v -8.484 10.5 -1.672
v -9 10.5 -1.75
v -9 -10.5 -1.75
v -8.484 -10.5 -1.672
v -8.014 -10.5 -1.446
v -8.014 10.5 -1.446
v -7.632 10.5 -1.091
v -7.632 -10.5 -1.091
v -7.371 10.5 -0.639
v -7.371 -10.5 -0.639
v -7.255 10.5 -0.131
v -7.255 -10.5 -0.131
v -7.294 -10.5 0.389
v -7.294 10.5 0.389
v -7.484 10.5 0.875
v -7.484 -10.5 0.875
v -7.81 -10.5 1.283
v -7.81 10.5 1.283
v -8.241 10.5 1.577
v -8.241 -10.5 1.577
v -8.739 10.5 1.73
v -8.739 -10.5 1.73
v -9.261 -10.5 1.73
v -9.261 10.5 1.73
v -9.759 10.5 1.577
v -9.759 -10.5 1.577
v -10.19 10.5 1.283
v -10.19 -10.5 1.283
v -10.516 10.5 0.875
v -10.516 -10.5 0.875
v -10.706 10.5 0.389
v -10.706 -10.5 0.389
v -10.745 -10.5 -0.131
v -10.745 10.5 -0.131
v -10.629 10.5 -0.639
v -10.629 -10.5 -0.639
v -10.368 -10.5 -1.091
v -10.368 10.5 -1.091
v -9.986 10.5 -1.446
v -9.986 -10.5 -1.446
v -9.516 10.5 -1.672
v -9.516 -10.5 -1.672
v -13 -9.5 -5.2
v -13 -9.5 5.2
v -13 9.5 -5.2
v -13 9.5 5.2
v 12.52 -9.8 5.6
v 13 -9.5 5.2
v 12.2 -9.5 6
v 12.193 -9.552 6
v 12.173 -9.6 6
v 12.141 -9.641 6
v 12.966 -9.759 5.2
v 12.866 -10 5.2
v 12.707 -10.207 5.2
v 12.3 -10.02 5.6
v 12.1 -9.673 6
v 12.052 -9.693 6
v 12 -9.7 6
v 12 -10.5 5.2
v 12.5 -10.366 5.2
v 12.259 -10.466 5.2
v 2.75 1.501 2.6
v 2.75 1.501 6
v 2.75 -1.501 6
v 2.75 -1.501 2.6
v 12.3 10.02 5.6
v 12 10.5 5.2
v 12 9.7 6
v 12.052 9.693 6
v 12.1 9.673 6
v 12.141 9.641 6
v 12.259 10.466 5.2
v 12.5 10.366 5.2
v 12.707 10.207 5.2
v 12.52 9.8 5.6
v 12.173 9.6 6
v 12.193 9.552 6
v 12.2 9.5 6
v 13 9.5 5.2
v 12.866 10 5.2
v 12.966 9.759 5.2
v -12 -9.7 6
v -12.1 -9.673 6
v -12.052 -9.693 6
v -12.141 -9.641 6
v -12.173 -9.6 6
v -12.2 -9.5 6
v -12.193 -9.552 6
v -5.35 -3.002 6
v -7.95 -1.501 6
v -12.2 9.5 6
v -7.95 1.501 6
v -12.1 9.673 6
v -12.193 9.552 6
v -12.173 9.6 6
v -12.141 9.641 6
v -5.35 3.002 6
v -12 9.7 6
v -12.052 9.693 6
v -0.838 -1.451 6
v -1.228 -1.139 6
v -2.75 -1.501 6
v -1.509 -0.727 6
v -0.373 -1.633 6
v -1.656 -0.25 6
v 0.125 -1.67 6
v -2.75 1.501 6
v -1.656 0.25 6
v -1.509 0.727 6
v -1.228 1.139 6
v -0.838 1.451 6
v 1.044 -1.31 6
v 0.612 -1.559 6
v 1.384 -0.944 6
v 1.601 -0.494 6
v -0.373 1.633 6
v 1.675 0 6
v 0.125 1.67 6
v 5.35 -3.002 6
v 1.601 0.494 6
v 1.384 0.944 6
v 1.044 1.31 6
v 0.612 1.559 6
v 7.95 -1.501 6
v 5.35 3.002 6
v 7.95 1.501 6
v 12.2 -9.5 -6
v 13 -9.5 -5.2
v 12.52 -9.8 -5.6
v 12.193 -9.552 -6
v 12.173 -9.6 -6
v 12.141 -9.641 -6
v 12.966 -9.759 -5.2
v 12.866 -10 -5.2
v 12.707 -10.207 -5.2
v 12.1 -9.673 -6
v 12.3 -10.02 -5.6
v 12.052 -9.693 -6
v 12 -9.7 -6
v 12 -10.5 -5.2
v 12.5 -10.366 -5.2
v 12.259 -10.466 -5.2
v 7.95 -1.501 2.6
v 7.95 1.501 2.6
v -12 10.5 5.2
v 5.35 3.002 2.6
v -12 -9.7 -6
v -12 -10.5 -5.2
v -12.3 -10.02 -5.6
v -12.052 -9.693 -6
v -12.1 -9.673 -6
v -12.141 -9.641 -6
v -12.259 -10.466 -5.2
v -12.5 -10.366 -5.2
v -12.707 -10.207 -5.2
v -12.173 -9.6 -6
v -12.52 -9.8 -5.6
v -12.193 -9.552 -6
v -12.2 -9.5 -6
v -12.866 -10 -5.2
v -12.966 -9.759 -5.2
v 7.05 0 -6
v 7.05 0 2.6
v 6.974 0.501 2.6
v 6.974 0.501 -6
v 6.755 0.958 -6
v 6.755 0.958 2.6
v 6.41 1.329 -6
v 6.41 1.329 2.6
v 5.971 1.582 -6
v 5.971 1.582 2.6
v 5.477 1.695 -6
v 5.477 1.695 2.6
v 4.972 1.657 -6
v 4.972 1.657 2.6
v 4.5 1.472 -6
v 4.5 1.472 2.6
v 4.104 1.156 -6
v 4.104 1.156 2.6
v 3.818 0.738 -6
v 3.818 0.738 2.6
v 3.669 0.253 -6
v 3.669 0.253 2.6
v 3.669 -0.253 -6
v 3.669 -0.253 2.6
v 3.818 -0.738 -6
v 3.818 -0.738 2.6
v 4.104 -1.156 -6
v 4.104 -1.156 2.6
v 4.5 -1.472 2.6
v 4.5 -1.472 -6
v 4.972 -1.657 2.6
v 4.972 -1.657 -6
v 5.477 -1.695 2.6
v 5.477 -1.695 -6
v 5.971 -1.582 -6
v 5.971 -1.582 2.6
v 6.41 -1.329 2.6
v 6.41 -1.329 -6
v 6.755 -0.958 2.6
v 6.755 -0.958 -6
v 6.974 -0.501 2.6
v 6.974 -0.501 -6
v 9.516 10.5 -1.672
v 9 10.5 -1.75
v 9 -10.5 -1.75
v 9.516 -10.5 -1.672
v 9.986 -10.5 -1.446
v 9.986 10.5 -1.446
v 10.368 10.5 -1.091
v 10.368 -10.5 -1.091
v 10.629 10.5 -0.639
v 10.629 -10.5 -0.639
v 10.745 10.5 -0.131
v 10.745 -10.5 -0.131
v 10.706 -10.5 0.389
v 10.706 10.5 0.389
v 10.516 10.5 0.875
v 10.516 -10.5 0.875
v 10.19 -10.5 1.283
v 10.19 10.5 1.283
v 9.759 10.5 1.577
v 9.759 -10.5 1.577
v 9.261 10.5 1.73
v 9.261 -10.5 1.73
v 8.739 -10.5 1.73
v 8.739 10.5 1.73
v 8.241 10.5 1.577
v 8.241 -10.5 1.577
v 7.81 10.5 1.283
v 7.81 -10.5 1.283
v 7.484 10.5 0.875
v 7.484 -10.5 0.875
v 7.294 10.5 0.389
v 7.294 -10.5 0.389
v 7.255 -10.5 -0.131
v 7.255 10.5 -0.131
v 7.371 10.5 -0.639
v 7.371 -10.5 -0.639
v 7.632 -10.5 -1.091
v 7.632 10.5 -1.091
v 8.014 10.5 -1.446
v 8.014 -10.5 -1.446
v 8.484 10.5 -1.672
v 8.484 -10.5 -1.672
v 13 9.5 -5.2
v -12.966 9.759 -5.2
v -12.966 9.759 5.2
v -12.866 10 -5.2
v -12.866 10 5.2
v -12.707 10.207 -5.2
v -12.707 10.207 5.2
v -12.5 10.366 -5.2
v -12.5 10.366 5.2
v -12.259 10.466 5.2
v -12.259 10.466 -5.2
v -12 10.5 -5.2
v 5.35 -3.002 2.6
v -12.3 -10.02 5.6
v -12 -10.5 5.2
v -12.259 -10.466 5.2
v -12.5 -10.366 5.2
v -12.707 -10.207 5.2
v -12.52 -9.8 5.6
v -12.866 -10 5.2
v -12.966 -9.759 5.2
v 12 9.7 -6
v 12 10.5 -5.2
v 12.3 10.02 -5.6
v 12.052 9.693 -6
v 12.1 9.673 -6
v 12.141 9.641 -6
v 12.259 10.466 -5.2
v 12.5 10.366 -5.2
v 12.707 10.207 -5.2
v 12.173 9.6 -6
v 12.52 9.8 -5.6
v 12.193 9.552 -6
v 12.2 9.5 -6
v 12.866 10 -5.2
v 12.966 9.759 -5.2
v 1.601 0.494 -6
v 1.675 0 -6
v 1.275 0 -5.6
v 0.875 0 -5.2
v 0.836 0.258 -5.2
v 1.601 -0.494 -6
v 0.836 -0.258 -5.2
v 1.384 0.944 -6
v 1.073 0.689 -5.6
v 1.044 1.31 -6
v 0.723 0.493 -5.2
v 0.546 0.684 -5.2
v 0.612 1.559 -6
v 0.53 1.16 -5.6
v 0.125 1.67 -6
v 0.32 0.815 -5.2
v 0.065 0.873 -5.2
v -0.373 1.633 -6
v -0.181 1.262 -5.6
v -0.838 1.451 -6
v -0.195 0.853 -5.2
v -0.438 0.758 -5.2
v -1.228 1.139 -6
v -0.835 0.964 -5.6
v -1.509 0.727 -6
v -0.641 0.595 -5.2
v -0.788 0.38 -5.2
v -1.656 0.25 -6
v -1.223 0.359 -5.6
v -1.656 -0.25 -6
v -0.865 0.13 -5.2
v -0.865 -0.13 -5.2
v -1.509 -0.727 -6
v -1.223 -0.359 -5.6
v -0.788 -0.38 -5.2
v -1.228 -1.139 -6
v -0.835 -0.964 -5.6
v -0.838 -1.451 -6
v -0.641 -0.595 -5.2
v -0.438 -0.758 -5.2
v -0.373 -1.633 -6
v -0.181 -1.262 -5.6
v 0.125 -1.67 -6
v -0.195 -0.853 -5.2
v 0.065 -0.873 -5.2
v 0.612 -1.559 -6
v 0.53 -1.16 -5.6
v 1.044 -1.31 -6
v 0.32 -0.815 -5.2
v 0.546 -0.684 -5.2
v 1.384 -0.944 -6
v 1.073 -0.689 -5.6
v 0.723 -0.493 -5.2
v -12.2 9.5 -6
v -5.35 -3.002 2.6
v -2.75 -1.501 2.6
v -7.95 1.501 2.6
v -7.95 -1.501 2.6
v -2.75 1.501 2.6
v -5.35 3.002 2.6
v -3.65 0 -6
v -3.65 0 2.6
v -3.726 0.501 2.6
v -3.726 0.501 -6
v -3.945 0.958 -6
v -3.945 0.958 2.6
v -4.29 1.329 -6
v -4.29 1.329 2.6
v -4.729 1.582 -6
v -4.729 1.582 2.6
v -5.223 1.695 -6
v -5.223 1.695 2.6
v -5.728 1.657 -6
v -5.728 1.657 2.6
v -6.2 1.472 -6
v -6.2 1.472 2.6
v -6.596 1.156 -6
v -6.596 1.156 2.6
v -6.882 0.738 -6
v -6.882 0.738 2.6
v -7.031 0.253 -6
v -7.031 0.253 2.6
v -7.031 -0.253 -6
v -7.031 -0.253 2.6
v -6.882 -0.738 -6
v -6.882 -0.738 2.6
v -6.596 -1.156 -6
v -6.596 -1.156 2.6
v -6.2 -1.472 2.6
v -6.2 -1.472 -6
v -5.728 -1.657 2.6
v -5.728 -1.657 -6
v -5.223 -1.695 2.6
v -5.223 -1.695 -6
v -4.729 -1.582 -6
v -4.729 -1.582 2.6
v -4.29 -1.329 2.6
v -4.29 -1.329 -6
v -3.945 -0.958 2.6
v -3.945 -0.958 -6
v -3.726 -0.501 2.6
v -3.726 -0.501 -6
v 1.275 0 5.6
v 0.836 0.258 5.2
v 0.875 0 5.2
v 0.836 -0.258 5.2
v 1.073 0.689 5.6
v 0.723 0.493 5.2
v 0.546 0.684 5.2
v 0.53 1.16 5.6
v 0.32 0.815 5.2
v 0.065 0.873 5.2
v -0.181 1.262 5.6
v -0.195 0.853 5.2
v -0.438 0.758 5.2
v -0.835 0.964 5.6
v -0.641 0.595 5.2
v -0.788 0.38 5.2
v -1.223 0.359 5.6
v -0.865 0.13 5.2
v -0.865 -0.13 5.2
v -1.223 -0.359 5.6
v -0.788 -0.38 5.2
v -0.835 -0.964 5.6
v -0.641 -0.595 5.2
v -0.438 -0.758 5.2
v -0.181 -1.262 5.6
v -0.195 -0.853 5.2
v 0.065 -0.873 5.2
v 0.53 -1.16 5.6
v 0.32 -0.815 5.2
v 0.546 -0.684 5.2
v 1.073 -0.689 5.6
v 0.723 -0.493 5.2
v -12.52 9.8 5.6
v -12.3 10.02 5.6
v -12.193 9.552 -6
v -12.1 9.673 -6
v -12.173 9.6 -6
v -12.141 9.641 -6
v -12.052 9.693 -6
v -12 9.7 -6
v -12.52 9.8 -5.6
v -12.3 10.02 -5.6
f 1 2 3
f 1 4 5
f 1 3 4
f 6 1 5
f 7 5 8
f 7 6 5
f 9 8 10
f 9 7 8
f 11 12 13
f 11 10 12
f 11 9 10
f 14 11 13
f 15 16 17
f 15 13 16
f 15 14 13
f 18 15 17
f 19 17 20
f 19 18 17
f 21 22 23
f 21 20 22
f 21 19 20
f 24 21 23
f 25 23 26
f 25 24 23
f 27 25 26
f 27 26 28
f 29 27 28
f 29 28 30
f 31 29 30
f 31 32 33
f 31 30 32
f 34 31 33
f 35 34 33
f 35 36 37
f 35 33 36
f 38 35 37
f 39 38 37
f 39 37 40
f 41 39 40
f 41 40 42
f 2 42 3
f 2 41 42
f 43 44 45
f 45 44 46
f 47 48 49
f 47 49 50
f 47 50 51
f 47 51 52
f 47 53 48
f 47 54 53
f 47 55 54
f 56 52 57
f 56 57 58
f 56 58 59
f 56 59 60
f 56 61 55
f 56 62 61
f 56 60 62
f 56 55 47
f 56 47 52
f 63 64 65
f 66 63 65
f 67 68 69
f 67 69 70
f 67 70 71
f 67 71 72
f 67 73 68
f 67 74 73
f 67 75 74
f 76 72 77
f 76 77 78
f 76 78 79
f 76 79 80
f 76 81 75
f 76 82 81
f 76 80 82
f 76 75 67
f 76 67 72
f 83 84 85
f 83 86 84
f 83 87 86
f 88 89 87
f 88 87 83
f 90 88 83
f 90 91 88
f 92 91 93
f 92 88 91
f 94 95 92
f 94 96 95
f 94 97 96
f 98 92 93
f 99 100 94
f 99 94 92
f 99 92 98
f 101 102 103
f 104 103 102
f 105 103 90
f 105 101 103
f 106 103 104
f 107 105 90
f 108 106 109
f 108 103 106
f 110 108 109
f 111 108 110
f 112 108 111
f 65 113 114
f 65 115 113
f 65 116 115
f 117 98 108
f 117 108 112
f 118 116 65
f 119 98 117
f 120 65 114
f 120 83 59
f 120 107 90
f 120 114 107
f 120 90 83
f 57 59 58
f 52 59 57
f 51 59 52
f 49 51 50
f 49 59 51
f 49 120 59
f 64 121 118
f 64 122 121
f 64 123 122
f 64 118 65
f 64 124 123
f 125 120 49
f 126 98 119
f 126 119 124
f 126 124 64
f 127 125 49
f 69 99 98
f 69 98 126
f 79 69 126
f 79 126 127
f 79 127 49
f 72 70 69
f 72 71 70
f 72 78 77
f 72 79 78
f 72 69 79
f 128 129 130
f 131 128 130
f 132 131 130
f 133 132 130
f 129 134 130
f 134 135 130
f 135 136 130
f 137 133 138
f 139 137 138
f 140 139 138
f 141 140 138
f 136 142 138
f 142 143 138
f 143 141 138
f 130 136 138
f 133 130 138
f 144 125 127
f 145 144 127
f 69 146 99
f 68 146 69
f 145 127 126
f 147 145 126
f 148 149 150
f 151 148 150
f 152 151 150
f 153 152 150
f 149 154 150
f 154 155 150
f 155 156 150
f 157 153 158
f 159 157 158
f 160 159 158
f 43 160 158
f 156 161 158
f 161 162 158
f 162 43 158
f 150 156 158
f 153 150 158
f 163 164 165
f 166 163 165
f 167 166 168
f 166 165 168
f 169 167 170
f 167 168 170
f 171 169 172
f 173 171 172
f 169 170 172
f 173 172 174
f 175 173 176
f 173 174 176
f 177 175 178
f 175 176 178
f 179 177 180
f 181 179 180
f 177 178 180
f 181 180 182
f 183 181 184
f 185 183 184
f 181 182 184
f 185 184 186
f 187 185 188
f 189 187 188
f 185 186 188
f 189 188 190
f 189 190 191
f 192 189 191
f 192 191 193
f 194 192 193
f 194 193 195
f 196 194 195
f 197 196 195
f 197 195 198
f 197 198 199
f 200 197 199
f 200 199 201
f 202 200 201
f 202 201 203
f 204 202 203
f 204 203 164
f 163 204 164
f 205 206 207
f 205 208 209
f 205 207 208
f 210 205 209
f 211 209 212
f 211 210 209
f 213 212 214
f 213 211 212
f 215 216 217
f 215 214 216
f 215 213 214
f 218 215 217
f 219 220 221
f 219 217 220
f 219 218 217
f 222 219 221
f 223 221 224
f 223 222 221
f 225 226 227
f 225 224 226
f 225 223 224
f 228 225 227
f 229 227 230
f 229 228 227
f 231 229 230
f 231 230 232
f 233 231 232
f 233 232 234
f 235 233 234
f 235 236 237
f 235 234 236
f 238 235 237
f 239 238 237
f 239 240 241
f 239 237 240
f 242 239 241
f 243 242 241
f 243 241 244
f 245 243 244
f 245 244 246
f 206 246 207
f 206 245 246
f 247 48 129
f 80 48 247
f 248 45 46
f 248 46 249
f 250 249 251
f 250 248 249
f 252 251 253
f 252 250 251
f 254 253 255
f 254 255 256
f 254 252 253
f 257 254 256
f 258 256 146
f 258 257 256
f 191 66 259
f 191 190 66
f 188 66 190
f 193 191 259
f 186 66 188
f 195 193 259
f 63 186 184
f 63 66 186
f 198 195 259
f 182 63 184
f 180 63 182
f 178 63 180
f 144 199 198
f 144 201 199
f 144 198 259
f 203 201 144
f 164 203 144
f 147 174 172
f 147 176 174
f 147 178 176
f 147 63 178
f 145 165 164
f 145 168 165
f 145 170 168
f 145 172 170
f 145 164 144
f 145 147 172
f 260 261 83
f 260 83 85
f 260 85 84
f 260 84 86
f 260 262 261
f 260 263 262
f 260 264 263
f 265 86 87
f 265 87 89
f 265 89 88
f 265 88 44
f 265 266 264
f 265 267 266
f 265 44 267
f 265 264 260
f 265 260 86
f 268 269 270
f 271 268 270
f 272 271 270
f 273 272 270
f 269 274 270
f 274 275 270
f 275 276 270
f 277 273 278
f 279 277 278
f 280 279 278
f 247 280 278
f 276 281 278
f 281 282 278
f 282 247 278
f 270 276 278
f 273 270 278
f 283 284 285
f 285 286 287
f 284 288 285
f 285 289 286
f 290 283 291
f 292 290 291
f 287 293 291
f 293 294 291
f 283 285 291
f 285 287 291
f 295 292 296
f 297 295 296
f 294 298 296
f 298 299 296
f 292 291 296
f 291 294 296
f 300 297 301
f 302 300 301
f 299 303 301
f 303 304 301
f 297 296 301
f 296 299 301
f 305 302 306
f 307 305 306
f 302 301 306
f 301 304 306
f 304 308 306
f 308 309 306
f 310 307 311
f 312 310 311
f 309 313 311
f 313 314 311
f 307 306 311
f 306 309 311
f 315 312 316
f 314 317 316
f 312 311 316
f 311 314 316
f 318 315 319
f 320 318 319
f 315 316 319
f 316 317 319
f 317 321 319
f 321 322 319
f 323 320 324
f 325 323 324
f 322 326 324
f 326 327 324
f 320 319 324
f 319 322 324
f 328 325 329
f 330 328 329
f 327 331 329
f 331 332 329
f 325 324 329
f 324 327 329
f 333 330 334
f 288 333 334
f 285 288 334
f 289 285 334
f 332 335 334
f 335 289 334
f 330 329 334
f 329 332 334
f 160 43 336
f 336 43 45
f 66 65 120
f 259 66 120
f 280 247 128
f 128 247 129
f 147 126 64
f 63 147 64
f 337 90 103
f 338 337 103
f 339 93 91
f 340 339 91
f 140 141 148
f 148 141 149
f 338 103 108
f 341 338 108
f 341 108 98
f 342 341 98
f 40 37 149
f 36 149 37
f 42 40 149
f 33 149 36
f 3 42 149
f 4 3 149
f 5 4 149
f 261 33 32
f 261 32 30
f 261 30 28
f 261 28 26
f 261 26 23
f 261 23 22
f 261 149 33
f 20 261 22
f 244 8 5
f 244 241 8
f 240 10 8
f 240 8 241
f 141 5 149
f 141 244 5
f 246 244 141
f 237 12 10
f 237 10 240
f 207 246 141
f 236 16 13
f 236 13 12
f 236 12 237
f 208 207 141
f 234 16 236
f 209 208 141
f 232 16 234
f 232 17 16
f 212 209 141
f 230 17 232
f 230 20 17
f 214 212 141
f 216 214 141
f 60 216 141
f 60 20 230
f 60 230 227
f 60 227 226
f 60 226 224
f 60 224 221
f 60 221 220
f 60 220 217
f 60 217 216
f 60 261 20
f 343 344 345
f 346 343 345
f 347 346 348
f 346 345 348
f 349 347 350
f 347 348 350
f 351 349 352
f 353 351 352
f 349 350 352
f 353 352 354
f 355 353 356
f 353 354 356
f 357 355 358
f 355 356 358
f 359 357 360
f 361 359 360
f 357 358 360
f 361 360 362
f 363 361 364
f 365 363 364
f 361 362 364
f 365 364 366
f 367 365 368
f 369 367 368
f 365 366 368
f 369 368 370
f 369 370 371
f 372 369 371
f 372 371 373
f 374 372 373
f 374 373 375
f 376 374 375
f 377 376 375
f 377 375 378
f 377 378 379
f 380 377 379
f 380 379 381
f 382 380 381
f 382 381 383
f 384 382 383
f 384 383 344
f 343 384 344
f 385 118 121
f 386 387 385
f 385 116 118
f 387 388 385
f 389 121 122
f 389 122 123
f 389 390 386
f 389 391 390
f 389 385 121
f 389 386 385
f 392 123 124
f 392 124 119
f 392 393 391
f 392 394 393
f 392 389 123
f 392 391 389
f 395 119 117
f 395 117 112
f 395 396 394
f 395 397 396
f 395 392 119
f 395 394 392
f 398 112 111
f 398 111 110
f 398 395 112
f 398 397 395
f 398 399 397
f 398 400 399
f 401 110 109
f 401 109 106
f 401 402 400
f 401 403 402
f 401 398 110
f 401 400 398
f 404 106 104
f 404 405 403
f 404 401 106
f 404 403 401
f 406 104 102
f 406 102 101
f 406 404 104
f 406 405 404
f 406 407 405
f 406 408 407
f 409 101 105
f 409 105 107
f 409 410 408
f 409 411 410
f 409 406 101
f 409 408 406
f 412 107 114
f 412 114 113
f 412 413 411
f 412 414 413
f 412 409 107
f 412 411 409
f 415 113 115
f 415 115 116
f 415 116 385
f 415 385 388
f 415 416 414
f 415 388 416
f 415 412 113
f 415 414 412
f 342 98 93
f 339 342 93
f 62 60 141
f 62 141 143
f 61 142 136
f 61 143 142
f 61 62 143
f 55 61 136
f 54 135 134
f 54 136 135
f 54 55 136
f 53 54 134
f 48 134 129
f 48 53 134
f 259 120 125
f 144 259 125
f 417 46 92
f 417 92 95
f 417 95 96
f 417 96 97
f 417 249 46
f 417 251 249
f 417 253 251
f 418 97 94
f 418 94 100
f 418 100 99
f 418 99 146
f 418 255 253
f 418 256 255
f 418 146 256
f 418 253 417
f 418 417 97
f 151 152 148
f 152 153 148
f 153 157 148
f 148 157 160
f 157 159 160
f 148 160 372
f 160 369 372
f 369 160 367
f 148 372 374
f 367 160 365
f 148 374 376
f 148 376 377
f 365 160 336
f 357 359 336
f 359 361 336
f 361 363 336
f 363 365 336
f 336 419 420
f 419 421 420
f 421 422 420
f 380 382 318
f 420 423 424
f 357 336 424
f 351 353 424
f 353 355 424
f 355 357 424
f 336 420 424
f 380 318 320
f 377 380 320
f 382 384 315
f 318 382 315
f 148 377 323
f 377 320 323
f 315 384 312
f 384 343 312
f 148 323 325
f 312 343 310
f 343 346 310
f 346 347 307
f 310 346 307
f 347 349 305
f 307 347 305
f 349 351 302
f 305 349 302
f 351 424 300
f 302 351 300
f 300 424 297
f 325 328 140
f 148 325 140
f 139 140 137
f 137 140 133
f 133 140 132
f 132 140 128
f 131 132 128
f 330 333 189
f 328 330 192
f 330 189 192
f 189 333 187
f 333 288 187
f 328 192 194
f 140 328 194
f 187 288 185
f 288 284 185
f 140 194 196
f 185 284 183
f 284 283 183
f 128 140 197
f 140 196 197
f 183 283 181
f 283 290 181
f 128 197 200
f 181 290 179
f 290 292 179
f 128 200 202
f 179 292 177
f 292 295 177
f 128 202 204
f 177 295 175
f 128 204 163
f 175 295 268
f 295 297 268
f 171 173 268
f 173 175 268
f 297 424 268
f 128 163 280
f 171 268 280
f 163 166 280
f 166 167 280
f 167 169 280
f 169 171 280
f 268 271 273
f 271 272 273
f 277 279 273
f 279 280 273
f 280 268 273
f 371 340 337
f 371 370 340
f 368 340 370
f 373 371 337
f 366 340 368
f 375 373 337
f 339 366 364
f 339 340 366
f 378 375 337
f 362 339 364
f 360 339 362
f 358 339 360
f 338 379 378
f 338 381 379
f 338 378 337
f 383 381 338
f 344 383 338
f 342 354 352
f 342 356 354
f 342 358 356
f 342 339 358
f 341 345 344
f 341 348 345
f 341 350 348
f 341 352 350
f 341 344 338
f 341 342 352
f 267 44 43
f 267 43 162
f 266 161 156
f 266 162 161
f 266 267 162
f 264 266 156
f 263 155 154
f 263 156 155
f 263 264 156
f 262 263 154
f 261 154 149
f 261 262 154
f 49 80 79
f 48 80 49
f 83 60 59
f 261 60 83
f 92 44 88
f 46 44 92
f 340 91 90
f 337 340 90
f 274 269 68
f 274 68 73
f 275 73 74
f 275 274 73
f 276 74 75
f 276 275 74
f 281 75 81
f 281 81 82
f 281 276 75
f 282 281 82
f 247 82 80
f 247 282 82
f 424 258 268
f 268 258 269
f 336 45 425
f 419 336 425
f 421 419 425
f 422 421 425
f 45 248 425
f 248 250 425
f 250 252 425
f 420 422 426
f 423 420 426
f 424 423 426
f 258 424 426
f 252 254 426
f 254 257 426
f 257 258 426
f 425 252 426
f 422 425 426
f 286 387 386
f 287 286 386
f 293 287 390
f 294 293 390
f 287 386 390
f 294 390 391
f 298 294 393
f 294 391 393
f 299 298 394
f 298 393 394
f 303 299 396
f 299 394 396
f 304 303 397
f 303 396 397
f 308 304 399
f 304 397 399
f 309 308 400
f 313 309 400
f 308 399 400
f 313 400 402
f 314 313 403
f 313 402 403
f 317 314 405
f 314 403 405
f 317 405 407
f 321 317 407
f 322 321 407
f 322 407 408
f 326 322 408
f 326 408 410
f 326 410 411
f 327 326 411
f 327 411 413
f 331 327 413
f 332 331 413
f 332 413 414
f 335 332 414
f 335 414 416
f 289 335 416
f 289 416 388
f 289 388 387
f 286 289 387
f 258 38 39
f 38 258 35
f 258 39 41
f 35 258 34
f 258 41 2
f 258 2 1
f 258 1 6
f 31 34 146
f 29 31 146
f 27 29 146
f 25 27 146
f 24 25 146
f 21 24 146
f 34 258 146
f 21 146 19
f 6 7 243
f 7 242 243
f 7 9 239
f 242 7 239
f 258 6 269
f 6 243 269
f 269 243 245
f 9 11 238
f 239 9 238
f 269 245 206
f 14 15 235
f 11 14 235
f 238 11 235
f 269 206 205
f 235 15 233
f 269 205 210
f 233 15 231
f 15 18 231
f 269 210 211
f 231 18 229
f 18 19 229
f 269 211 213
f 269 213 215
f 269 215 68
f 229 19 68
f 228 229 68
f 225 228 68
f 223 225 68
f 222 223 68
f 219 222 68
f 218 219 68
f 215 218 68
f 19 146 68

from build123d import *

# Parameters (mm, degrees)
CROQUIS1_W                 = 26
CROQUIS1_H                 = 21
SALIENTE_EXTRUIR1_DEPTH    = 6
CORTAR_EXTRUIR1_DEPTH      = 26.416530054
CORTAR_EXTRUIR1_DEPTH_BACK = 26.416530054
CROQUIS2_R                 = 1.75
CROQUIS3_R                 = 0.875
CORTAR_EXTRUIR2_DEPTH      = 15
REDONDEO1_R                = 1
CHAFL_N1_SIZE              = 0.8
CHAFL_N2_SIZE              = 0.8
CORTAR_EXTRUIR3_DEPTH      = 3.4
CROQUIS5_R                 = 1.7
CORTAR_EXTRUIR4_DEPTH      = 40


with BuildPart() as part:
    # Croquis1 → Saliente-Extruir1 (new, symmetric)
    with BuildSketch(Plane.XY):
        Rectangle(CROQUIS1_W, CROQUIS1_H)
    extrude(amount=SALIENTE_EXTRUIR1_DEPTH, both=True)

    # Croquis2 → Cortar-Extruir1 (cut, two sides: drawn at the far end of the back side and taken through both)
    with BuildSketch(Plane.XZ.offset(10.5).offset(-CORTAR_EXTRUIR1_DEPTH_BACK)):
        with Locations(Location((-9, 0, 0), (0, 0, 270))):
            Circle(CROQUIS2_R)
        with Locations(Location((9, 0, 0), (0, 0, 270))):
            Circle(CROQUIS2_R)
    extrude(amount=CORTAR_EXTRUIR1_DEPTH + CORTAR_EXTRUIR1_DEPTH_BACK, mode=Mode.SUBTRACT)

    # Croquis3 → Cortar-Extruir2 (cut)
    with BuildSketch(Plane.XY.offset(6)):
        Circle(CROQUIS3_R)
    extrude(amount=-CORTAR_EXTRUIR2_DEPTH, mode=Mode.SUBTRACT)

    # Redondeo1
    redondeo1_edges = [part.edges().sort_by_distance(p)[0] for p in [
        (13, -10.5, 0),
        (-13, -10.5, 0),
        (-13, 10.5, 0),
        (13, 10.5, 0),
    ]]
    fillet(redondeo1_edges, radius=REDONDEO1_R)

    # Chaflán1
    chafl_n1_edges = [part.edges().sort_by_distance(p)[0] for p in [
        (0, 10.5, -6),
        (0, 10.5, 6),
        (13, 0, -6),
        (0, -10.5, -6),
        (-13, 0, -6),
        (-12.707106781, -10.207106781, -6),
        (12.707106781, -10.207106781, -6),
        (-12.707106781, 10.207106781, -6),
        (12.707106781, 10.207106781, -6),
        (13, 0, 6),
        (-13, 0, 6),
        (0, -10.5, 6),
        (-12.707106781, -10.207106781, 6),
        (12.707106781, -10.207106781, 6),
        (-12.707106781, 10.207106781, 6),
        (12.707106781, 10.207106781, 6),
    ]]
    chamfer(chafl_n1_edges, length=CHAFL_N1_SIZE)

    # Chaflán2
    chafl_n2_edges = [part.edges().sort_by_distance(p)[0] for p in [
        (-0.875, 0, -6),
        (-0.875, 0, 6),
    ]]
    chamfer(chafl_n2_edges, length=CHAFL_N2_SIZE)

    # Croquis4 → Cortar-Extruir3 (cut)
    with BuildSketch(Plane.XY.offset(6)):
        Polygon((-5.35, 3.0022214), (-7.95, 1.5011107), (-7.95, -1.5011107), (-5.35, -3.0022214), (-2.75, -1.5011107), (-2.75, 1.5011107), align=None)
        Polygon((5.35, 3.0022214), (2.75, 1.5011107), (2.75, -1.5011107), (5.35, -3.0022214), (7.95, -1.5011107), (7.95, 1.5011107), align=None)
    extrude(amount=-CORTAR_EXTRUIR3_DEPTH, mode=Mode.SUBTRACT)

    # Croquis5 → Cortar-Extruir4 (cut)
    with BuildSketch(Plane.XY.offset(2.6)):
        with Locations((5.35, 0)):
            Circle(CROQUIS5_R)
        with Locations((-5.35, 0)):
            Circle(CROQUIS5_R)
    extrude(amount=-CORTAR_EXTRUIR4_DEPTH, mode=Mode.SUBTRACT)


solid = part.part
